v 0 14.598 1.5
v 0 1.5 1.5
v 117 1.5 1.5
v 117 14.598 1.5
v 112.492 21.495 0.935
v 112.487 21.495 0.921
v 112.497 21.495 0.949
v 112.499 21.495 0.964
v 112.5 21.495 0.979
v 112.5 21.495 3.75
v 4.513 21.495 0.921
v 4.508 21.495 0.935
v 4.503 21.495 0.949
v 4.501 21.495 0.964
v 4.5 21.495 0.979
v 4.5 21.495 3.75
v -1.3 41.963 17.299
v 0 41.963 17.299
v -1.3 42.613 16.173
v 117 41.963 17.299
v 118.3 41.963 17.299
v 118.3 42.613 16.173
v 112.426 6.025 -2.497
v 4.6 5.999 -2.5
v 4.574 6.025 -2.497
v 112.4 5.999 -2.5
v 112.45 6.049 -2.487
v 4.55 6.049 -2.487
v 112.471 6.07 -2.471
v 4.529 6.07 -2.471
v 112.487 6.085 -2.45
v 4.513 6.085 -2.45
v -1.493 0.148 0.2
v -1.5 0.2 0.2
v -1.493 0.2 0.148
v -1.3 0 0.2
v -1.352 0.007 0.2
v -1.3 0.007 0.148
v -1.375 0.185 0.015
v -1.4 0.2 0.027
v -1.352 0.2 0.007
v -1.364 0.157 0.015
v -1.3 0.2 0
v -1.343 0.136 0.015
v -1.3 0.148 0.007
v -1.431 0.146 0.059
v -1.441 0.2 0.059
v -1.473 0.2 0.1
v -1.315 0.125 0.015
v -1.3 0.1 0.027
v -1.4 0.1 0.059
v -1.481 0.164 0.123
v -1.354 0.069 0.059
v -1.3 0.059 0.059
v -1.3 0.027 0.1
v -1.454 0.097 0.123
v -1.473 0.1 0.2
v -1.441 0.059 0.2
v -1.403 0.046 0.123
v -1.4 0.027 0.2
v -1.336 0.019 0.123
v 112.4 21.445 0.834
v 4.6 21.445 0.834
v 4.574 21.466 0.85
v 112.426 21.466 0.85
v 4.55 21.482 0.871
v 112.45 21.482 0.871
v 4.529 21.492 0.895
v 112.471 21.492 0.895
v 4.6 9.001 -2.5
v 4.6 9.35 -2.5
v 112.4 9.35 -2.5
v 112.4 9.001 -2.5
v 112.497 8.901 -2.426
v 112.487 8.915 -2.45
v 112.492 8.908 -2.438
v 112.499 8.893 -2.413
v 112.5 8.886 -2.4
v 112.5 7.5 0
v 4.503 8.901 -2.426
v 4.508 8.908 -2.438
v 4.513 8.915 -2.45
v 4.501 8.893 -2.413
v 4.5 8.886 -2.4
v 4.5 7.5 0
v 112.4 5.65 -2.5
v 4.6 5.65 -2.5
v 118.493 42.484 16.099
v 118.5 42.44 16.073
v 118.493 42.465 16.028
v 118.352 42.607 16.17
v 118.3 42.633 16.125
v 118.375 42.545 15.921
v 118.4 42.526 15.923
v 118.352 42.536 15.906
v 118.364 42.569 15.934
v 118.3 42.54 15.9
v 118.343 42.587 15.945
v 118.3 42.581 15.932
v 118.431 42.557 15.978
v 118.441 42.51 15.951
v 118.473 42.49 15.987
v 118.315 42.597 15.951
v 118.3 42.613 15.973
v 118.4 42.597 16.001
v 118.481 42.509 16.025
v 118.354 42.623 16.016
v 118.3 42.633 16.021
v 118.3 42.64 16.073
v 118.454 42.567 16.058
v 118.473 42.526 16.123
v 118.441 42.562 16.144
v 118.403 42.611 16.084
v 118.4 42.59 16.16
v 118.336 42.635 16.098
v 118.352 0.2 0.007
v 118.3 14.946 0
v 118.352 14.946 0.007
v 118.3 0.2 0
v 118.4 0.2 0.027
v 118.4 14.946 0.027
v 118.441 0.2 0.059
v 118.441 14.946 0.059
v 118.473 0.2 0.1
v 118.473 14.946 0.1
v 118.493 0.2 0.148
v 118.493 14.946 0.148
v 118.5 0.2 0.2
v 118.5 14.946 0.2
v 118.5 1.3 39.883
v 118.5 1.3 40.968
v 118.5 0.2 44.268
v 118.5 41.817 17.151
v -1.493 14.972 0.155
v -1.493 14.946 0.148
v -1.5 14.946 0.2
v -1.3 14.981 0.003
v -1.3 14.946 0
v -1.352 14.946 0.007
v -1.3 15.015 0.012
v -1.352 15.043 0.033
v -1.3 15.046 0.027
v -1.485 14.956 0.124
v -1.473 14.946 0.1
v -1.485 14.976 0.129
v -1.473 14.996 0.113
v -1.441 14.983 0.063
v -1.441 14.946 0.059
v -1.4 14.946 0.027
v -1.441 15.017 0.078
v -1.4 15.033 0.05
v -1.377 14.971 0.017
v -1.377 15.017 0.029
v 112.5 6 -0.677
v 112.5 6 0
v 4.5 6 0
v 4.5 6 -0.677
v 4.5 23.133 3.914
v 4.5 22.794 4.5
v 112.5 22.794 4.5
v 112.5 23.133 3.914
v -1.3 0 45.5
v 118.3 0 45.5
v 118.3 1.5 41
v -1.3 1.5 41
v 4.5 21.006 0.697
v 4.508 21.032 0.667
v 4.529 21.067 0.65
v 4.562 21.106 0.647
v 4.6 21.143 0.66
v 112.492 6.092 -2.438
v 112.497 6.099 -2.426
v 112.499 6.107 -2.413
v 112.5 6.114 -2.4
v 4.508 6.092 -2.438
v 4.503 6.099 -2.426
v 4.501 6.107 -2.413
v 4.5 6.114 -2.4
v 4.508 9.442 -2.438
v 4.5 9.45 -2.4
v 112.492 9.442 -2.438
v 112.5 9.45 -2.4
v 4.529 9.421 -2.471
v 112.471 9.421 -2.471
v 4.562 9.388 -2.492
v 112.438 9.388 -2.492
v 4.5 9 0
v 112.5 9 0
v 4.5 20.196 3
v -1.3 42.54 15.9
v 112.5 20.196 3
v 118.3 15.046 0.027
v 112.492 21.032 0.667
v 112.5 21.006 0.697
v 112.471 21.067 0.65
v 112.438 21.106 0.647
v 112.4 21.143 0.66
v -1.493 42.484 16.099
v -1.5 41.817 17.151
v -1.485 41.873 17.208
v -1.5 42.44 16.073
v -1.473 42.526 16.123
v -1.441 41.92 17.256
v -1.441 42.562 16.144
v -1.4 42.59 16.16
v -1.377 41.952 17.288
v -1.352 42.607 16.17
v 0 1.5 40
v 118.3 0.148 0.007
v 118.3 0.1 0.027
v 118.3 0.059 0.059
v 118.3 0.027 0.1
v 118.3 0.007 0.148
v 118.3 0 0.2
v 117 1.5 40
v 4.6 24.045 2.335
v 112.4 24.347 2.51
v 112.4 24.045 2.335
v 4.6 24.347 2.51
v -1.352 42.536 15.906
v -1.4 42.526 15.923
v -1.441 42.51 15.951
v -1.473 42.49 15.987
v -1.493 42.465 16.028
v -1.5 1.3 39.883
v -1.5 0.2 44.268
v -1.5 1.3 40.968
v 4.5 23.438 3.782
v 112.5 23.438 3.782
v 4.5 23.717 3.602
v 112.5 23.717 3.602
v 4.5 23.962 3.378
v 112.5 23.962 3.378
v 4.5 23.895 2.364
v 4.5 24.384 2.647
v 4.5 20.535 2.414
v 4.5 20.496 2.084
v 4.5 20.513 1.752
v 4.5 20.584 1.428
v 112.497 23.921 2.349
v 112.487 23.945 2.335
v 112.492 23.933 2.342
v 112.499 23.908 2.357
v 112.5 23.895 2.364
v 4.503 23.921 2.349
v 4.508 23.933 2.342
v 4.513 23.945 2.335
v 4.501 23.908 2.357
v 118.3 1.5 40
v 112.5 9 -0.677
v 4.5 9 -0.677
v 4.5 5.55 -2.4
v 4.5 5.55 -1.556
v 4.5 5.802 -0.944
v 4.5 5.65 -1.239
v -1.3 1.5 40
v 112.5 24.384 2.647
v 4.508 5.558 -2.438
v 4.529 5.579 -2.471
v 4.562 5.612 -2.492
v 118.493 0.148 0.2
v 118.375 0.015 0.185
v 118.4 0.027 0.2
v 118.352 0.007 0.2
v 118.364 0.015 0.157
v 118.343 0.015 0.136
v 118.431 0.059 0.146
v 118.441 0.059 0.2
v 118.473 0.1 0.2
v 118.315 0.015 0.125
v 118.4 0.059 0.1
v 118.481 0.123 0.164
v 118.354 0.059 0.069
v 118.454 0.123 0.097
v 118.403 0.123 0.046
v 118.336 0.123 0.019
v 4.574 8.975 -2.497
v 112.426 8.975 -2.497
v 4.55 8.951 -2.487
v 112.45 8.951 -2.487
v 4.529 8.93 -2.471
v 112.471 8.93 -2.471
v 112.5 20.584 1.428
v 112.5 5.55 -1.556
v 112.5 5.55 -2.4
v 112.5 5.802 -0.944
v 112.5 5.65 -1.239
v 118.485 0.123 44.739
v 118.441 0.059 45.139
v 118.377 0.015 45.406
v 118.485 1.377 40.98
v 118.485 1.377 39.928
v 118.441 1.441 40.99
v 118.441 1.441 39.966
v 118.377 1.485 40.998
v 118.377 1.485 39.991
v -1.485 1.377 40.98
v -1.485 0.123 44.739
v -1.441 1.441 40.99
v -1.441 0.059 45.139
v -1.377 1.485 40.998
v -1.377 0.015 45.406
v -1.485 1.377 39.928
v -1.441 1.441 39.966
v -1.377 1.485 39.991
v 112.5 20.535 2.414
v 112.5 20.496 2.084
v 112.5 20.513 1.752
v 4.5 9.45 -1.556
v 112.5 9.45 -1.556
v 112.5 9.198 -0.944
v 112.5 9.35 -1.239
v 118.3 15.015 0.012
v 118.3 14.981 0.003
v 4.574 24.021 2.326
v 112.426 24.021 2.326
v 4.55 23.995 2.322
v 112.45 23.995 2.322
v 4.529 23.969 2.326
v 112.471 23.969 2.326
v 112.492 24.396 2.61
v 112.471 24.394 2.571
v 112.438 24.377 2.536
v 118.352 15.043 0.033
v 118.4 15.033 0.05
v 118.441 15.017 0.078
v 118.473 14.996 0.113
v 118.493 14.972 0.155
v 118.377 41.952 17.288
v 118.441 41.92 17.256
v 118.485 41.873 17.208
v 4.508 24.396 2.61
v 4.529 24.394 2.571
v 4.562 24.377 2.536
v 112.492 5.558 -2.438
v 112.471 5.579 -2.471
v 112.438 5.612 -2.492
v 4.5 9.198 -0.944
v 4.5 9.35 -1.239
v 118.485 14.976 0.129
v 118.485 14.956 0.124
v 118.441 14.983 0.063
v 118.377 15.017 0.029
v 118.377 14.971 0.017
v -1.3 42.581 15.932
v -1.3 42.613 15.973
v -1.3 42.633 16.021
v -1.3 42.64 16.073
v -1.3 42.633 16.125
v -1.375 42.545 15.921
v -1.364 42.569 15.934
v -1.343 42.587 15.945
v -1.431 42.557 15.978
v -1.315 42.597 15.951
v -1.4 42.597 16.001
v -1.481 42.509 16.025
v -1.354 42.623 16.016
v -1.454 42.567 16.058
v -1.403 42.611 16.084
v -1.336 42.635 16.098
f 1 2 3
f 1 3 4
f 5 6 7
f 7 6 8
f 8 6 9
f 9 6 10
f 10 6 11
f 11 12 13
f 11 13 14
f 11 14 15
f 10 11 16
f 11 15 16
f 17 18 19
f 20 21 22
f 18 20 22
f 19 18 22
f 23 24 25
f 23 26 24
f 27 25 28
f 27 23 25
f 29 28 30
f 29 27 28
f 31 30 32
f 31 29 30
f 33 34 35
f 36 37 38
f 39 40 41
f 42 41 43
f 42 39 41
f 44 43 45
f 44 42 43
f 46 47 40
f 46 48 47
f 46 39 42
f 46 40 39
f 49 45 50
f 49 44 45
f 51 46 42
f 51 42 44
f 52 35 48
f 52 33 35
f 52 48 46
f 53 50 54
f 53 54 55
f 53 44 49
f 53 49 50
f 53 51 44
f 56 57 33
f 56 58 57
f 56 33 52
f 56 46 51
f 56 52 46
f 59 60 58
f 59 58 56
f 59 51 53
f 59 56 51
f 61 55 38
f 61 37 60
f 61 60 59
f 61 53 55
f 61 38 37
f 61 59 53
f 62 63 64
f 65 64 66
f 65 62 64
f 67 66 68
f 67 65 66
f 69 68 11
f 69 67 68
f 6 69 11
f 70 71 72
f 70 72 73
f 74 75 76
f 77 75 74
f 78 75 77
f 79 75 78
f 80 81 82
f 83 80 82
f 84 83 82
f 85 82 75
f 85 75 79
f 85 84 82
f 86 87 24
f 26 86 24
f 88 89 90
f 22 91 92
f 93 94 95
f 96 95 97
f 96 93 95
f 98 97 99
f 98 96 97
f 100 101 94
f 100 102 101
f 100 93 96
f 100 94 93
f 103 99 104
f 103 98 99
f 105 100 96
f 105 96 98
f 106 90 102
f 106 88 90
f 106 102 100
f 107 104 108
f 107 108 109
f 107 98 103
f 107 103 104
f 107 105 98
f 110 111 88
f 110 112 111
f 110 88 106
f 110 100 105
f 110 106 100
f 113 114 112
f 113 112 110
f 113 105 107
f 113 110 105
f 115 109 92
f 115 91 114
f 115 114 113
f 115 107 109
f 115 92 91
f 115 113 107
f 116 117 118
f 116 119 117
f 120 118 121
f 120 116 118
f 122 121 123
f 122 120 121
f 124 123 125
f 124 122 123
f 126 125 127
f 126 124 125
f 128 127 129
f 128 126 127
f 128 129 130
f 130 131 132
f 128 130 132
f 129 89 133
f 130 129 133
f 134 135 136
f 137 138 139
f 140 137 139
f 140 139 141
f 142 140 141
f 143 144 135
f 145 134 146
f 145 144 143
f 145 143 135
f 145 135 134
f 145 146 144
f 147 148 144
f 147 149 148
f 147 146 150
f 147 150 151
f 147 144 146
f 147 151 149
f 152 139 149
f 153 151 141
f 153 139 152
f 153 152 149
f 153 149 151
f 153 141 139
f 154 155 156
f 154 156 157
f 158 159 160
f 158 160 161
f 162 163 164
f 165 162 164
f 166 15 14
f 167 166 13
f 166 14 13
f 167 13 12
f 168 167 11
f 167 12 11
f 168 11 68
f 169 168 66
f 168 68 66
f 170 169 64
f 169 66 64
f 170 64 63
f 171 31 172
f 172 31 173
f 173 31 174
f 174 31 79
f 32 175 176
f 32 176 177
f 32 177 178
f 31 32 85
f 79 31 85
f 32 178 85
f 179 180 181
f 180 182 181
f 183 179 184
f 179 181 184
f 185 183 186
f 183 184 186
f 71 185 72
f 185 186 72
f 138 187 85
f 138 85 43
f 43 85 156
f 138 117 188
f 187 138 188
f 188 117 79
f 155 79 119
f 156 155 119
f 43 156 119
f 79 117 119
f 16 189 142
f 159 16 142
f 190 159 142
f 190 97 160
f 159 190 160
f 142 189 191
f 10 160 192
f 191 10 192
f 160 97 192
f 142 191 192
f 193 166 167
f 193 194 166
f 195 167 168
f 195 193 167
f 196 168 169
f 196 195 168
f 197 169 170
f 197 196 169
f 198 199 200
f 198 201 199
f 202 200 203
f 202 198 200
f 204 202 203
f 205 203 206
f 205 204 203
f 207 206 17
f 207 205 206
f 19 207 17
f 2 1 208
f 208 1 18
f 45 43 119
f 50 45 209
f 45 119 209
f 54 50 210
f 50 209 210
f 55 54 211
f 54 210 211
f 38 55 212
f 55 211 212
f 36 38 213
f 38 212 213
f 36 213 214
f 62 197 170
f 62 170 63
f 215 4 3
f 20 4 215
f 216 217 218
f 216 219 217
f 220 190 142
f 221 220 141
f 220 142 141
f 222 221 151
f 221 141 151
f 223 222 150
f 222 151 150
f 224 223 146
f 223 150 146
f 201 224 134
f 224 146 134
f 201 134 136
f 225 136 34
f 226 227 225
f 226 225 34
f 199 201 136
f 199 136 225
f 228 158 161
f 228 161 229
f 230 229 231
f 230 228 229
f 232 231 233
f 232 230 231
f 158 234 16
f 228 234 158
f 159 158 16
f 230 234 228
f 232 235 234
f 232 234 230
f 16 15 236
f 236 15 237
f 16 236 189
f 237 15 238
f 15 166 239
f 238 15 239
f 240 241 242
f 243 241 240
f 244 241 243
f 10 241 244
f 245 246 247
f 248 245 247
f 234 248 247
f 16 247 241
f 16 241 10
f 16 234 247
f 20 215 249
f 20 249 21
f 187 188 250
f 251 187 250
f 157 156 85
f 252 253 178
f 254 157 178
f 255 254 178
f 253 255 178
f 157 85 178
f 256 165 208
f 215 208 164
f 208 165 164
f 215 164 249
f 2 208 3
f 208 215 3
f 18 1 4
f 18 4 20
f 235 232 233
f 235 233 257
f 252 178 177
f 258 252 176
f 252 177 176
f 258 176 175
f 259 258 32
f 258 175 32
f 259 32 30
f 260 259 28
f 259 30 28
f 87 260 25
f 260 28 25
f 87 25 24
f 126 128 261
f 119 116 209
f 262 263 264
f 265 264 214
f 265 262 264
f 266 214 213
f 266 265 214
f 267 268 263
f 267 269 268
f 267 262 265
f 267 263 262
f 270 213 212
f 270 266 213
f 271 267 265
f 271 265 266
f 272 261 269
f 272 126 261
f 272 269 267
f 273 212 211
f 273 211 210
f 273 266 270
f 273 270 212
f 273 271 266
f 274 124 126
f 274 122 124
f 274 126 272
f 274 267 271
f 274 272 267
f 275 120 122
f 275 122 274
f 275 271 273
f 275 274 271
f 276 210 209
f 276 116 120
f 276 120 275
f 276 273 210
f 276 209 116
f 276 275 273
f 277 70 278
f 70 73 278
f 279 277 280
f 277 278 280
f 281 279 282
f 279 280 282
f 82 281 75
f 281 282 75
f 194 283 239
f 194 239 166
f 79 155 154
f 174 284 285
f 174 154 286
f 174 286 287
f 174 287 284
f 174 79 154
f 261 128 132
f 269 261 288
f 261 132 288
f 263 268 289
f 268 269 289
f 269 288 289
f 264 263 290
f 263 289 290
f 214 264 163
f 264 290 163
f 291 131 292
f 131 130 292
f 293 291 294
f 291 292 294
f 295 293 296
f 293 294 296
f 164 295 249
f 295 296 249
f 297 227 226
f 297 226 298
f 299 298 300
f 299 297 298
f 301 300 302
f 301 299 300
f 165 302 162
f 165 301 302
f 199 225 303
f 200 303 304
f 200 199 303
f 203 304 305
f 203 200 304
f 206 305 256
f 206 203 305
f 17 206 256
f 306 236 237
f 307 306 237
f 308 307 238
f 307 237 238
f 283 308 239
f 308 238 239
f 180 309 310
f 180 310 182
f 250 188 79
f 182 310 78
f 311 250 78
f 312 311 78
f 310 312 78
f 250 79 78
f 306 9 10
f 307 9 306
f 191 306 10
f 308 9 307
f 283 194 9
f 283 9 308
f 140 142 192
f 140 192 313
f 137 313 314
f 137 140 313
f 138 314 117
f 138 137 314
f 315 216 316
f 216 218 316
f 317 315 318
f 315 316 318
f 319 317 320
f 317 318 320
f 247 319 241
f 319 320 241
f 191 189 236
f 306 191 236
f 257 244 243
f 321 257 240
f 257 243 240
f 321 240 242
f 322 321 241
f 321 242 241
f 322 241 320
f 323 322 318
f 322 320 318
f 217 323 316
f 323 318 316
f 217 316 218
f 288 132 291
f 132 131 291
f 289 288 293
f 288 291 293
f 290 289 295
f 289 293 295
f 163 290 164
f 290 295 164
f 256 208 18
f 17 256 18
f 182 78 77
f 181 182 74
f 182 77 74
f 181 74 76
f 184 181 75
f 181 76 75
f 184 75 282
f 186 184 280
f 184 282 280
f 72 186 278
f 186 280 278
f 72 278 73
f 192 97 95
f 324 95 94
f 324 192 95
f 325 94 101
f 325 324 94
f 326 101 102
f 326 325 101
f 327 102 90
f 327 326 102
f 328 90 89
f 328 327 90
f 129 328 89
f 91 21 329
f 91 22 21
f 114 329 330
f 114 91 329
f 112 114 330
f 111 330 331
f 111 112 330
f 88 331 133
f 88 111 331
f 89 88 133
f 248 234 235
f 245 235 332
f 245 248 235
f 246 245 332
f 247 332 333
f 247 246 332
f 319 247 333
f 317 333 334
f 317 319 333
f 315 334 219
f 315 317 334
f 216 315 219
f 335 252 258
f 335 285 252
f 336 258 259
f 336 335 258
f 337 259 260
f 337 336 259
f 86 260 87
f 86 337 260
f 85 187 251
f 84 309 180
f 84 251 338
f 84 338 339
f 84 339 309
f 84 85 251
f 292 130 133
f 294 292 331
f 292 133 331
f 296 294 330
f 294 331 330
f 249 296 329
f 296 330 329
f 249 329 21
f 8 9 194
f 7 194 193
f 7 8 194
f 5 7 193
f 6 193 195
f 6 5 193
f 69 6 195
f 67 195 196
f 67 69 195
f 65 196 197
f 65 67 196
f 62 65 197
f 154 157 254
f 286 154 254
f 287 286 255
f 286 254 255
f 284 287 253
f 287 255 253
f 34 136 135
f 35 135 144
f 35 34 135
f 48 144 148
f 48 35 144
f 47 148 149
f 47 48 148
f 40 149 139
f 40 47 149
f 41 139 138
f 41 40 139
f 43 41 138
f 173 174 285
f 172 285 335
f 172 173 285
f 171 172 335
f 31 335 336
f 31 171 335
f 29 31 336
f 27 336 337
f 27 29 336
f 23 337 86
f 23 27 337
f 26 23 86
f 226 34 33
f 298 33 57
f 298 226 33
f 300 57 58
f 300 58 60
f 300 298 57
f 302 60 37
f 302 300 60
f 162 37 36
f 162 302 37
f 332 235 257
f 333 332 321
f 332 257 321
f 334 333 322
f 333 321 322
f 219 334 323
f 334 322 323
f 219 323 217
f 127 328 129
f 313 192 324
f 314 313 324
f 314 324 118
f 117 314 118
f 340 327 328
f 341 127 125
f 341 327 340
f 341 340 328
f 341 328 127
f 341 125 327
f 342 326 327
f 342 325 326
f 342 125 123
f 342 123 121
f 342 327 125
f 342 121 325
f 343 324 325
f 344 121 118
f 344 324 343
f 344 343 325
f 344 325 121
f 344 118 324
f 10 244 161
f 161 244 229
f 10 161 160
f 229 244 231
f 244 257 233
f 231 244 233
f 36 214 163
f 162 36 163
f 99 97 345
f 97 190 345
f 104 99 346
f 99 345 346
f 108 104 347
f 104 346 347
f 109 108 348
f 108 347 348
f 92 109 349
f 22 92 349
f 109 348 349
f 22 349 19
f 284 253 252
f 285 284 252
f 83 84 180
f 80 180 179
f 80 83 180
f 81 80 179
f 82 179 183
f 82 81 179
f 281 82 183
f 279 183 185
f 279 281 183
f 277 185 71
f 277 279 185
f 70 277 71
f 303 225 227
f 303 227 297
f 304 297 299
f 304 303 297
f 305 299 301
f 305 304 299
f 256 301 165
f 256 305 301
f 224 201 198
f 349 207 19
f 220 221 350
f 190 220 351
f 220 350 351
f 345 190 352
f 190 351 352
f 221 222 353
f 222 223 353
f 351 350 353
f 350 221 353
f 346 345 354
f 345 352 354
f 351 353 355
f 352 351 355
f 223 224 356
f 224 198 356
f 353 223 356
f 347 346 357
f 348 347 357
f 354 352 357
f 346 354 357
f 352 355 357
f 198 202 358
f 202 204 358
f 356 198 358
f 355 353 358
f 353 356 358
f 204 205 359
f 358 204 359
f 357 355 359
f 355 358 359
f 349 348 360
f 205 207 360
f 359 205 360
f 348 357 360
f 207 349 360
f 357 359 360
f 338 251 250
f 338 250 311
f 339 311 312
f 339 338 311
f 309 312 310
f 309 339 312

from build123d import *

# Parameters (mm, degrees)
EXTRUDE_1_DEPTH = 117
EXTRUDE_2_DEPTH = 1.5
EXTRUDE_3_DEPTH = 1.5
EXTRUDE_START   = -6
EXTRUDE_4_DEPTH = 108
EXTRUDE_5_DEPTH = 108
FILLET_1_R      = 0.1
FILLET_2_R      = 0.2


with BuildPart() as part:
    # 草图1 → 凸台-拉伸1 (new body)
    with BuildSketch(Plane(origin=(0, 0, 0), x_dir=(0, 0, -1), z_dir=(1, 0, 0))):
        Polygon((0, 0), (-40, 0), (-45.5, 0), (-41, 1.5), (-40, 1.5), (-1.5, 1.5), (-1.5, 14.598076211), (-17.299038106, 41.962812921), (-16, 42.712812921), (0, 15), align=None)
    extrude(amount=EXTRUDE_1_DEPTH)

    # 草图2 → 凸台-拉伸2 (add)
    with BuildSketch(Plane(origin=(117, 0, 0), x_dir=(0, 0, -1), z_dir=(1, 0, 0))):
        Polygon((-41, 1.5), (-40, 1.5), (-17.299038106, 41.962812921), (-16, 42.712812921), (0, 15), (0, 0), (-45.5, 0), align=None)
    extrude(amount=EXTRUDE_2_DEPTH)

    # 草图3 → 凸台-拉伸3 (add)
    with BuildSketch(Plane.ZY):
        Polygon((41, 1.5), (40, 1.5), (17.299038106, 41.962812921), (16, 42.712812921), (0, 15), (0, 0), (45.5, 0), align=None)
    extrude(amount=EXTRUDE_3_DEPTH)

    # 草图4 → 凸台-拉伸4 (add)
    with BuildSketch(Plane.ZY.offset(1.5).offset(EXTRUDE_START)):
        with BuildLine():
            Line((0, 7.5), (0, 6))
            Line((0, 6), (-0.677124344, 6))
            ThreePointArc((-0.677124344, 6), (-1.088161527, 5.719957697), (-1.555590279, 5.55))
            Line((-1.555590279, 5.55), (-2.5, 5.55))
            Line((-2.5, 5.55), (-2.5, 6.056624327))
            Line((-2.5, 6.056624327), (0, 7.5))
        make_face()
    extrude_4 = extrude(amount=-EXTRUDE_4_DEPTH)

    # 镜向1: 凸台-拉伸4 across plane
    add(extrude_4.mirror(Plane(origin=(0, 7.5, 0), x_dir=(0, 0, 1), z_dir=(0, -1, 0))))

    # 草图5 → 凸台-拉伸5 (add)
    with BuildSketch(Plane.ZY.offset(1.5).offset(EXTRUDE_START)):
        with BuildLine():
            Line((3.75, 21.495190528), (4.5, 22.794228634))
            Line((4.5, 22.794228634), (3.913593116, 23.132790806))
            ThreePointArc((3.913593116, 23.132790806), (3.697645625, 23.580833146), (3.3778193, 23.961735205))
            Line((3.3778193, 23.961735205), (2.559936491, 24.433940066))
            Line((2.559936491, 24.433940066), (2.306624327, 23.995190528))
            Line((2.306624327, 23.995190528), (3.75, 21.495190528))
        make_face()
    extrude_5 = extrude(amount=-EXTRUDE_5_DEPTH)

    # 镜向2: 凸台-拉伸5 across plane
    add(extrude_5.mirror(Plane(origin=(0, 17.745190528, 10.245190528), x_dir=(0, -0.49999999999999695, 0.8660254037844404), z_dir=(0, 0.8660254037844406, 0.49999999999999684))))

    # 圆角1
    fillet_1_edges = [part.edges().sort_by_distance(p)[0] for p in [
        (112.5, 24.214565297, 2.433280409),
        (58.5, 23.995190528, 2.306624327),
        (58.5, 24.433940066, 2.559936491),
        (4.5, 24.214565297, 2.433280409),
        (58.5, 21.495190528, 0.863248654),
        (4.5, 21.27581576, 0.736592572),
        (58.5, 21.056440991, 0.609936491),
        (112.5, 21.27581576, 0.736592572),
        (58.5, 6.056624327, -2.5),
        (112.5, 5.803312164, -2.5),
        (58.5, 5.55, -2.5),
        (4.5, 5.803312164, -2.5),
        (4.5, 9.196687836, -2.5),
        (58.5, 8.943375673, -2.5),
        (58.5, 9.45, -2.5),
        (112.5, 9.196687836, -2.5),
    ]]
    fillet(fillet_1_edges, radius=FILLET_1_R)

    # 圆角2
    fillet_2_edges = [part.edges().sort_by_distance(p)[0] for p in [
        (118.5, 0.75, 43.25),
        (118.5, 1.5, 40.5),
        (118.5, 21.731406461, 28.649519053),
        (118.5, 42.337812921, 16.649519053),
        (118.5, 28.856406461, 8),
        (118.5, 7.5, 0),
        (118.5, 0, 22.75),
        (-1.5, 42.337812921, 16.649519053),
        (-1.5, 21.731406461, 28.649519053),
        (-1.5, 1.5, 40.5),
        (-1.5, 0.75, 43.25),
        (-1.5, 0, 22.75),
        (-1.5, 7.5, 0),
        (-1.5, 28.856406461, 8),
        (58.5, 0, 0),
        (58.5, 15, 0),
        (58.5, 42.712812921, 16),
    ]]
    fillet(fillet_2_edges, radius=FILLET_2_R)


solid = part.part
